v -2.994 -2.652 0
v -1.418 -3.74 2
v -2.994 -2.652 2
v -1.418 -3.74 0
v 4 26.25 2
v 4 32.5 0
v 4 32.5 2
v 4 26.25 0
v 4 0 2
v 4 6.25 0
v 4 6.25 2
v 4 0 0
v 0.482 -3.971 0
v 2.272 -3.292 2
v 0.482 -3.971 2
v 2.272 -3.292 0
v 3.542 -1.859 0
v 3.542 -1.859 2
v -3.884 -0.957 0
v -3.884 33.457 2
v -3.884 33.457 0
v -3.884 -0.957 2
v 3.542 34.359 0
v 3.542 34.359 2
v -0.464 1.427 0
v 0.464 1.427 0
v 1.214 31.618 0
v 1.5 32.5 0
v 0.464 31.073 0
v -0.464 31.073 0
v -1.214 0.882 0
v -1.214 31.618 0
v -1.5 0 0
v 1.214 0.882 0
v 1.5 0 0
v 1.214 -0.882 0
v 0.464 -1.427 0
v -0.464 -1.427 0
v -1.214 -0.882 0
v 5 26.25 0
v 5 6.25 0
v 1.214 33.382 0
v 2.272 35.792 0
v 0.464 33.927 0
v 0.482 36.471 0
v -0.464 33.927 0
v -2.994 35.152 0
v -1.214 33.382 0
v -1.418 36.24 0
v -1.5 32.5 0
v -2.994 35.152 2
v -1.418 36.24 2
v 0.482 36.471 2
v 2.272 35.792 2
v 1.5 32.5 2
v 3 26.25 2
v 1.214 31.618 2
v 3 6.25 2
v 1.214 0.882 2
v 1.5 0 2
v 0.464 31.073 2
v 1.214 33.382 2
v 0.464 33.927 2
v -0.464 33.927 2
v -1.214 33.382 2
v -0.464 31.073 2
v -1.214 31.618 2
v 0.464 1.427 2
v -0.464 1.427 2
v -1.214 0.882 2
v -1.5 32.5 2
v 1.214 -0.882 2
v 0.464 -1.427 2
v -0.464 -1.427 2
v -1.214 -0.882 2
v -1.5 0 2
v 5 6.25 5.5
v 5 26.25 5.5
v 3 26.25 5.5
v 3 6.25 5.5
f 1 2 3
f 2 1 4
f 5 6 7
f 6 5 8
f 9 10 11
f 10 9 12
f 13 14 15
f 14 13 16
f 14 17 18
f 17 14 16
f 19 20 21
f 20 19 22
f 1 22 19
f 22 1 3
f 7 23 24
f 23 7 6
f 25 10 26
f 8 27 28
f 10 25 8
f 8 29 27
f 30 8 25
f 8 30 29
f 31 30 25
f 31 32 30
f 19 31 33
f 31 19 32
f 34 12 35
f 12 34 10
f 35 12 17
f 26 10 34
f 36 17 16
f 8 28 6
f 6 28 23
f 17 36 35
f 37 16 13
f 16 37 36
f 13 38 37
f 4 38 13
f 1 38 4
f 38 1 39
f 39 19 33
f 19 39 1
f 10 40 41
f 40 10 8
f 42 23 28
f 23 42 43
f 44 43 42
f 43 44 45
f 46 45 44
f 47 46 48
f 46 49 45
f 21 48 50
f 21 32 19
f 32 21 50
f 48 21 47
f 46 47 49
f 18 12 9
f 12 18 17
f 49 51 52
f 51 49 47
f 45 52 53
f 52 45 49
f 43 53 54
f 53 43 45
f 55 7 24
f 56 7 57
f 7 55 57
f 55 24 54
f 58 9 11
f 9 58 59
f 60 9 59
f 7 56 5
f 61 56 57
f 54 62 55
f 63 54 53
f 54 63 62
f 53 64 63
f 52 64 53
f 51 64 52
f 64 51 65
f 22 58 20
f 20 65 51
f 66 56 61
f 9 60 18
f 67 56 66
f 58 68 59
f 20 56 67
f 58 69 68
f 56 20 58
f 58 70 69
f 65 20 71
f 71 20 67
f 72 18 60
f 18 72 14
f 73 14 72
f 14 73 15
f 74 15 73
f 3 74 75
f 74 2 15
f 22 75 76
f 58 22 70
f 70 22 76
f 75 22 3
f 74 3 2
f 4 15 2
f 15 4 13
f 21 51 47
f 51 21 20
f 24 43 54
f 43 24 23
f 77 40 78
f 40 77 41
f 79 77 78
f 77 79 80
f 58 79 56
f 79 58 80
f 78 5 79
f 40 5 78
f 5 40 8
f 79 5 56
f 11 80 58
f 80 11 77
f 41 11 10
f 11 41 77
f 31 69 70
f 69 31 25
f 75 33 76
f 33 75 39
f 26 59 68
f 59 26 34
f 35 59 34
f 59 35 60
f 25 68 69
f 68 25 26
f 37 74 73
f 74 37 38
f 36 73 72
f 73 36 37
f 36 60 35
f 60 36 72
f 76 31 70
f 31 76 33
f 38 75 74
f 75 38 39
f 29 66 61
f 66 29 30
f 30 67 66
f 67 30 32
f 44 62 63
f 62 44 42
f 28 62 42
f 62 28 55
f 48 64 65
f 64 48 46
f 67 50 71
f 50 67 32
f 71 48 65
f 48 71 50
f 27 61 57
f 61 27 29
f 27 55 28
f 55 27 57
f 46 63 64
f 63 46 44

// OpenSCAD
module pillar() {
    union() {
        hull(){
            cylinder(2, 4, 4);
            translate([0, 32.5, 0]) cylinder(2, 4, 4);
        }
        translate([3, 32.5/2-10, 0]) cube([2, 20, 3.5+2]);
    }
}

module hole() {
    translate([0, 0, -1]) cylinder(12, 1.5, 1.5, $fn=10);
    translate([0, 32.5, -1]) cylinder(12, 1.5, 1.5, $fn=10);
}


difference() {
    pillar();
    hole();
}
